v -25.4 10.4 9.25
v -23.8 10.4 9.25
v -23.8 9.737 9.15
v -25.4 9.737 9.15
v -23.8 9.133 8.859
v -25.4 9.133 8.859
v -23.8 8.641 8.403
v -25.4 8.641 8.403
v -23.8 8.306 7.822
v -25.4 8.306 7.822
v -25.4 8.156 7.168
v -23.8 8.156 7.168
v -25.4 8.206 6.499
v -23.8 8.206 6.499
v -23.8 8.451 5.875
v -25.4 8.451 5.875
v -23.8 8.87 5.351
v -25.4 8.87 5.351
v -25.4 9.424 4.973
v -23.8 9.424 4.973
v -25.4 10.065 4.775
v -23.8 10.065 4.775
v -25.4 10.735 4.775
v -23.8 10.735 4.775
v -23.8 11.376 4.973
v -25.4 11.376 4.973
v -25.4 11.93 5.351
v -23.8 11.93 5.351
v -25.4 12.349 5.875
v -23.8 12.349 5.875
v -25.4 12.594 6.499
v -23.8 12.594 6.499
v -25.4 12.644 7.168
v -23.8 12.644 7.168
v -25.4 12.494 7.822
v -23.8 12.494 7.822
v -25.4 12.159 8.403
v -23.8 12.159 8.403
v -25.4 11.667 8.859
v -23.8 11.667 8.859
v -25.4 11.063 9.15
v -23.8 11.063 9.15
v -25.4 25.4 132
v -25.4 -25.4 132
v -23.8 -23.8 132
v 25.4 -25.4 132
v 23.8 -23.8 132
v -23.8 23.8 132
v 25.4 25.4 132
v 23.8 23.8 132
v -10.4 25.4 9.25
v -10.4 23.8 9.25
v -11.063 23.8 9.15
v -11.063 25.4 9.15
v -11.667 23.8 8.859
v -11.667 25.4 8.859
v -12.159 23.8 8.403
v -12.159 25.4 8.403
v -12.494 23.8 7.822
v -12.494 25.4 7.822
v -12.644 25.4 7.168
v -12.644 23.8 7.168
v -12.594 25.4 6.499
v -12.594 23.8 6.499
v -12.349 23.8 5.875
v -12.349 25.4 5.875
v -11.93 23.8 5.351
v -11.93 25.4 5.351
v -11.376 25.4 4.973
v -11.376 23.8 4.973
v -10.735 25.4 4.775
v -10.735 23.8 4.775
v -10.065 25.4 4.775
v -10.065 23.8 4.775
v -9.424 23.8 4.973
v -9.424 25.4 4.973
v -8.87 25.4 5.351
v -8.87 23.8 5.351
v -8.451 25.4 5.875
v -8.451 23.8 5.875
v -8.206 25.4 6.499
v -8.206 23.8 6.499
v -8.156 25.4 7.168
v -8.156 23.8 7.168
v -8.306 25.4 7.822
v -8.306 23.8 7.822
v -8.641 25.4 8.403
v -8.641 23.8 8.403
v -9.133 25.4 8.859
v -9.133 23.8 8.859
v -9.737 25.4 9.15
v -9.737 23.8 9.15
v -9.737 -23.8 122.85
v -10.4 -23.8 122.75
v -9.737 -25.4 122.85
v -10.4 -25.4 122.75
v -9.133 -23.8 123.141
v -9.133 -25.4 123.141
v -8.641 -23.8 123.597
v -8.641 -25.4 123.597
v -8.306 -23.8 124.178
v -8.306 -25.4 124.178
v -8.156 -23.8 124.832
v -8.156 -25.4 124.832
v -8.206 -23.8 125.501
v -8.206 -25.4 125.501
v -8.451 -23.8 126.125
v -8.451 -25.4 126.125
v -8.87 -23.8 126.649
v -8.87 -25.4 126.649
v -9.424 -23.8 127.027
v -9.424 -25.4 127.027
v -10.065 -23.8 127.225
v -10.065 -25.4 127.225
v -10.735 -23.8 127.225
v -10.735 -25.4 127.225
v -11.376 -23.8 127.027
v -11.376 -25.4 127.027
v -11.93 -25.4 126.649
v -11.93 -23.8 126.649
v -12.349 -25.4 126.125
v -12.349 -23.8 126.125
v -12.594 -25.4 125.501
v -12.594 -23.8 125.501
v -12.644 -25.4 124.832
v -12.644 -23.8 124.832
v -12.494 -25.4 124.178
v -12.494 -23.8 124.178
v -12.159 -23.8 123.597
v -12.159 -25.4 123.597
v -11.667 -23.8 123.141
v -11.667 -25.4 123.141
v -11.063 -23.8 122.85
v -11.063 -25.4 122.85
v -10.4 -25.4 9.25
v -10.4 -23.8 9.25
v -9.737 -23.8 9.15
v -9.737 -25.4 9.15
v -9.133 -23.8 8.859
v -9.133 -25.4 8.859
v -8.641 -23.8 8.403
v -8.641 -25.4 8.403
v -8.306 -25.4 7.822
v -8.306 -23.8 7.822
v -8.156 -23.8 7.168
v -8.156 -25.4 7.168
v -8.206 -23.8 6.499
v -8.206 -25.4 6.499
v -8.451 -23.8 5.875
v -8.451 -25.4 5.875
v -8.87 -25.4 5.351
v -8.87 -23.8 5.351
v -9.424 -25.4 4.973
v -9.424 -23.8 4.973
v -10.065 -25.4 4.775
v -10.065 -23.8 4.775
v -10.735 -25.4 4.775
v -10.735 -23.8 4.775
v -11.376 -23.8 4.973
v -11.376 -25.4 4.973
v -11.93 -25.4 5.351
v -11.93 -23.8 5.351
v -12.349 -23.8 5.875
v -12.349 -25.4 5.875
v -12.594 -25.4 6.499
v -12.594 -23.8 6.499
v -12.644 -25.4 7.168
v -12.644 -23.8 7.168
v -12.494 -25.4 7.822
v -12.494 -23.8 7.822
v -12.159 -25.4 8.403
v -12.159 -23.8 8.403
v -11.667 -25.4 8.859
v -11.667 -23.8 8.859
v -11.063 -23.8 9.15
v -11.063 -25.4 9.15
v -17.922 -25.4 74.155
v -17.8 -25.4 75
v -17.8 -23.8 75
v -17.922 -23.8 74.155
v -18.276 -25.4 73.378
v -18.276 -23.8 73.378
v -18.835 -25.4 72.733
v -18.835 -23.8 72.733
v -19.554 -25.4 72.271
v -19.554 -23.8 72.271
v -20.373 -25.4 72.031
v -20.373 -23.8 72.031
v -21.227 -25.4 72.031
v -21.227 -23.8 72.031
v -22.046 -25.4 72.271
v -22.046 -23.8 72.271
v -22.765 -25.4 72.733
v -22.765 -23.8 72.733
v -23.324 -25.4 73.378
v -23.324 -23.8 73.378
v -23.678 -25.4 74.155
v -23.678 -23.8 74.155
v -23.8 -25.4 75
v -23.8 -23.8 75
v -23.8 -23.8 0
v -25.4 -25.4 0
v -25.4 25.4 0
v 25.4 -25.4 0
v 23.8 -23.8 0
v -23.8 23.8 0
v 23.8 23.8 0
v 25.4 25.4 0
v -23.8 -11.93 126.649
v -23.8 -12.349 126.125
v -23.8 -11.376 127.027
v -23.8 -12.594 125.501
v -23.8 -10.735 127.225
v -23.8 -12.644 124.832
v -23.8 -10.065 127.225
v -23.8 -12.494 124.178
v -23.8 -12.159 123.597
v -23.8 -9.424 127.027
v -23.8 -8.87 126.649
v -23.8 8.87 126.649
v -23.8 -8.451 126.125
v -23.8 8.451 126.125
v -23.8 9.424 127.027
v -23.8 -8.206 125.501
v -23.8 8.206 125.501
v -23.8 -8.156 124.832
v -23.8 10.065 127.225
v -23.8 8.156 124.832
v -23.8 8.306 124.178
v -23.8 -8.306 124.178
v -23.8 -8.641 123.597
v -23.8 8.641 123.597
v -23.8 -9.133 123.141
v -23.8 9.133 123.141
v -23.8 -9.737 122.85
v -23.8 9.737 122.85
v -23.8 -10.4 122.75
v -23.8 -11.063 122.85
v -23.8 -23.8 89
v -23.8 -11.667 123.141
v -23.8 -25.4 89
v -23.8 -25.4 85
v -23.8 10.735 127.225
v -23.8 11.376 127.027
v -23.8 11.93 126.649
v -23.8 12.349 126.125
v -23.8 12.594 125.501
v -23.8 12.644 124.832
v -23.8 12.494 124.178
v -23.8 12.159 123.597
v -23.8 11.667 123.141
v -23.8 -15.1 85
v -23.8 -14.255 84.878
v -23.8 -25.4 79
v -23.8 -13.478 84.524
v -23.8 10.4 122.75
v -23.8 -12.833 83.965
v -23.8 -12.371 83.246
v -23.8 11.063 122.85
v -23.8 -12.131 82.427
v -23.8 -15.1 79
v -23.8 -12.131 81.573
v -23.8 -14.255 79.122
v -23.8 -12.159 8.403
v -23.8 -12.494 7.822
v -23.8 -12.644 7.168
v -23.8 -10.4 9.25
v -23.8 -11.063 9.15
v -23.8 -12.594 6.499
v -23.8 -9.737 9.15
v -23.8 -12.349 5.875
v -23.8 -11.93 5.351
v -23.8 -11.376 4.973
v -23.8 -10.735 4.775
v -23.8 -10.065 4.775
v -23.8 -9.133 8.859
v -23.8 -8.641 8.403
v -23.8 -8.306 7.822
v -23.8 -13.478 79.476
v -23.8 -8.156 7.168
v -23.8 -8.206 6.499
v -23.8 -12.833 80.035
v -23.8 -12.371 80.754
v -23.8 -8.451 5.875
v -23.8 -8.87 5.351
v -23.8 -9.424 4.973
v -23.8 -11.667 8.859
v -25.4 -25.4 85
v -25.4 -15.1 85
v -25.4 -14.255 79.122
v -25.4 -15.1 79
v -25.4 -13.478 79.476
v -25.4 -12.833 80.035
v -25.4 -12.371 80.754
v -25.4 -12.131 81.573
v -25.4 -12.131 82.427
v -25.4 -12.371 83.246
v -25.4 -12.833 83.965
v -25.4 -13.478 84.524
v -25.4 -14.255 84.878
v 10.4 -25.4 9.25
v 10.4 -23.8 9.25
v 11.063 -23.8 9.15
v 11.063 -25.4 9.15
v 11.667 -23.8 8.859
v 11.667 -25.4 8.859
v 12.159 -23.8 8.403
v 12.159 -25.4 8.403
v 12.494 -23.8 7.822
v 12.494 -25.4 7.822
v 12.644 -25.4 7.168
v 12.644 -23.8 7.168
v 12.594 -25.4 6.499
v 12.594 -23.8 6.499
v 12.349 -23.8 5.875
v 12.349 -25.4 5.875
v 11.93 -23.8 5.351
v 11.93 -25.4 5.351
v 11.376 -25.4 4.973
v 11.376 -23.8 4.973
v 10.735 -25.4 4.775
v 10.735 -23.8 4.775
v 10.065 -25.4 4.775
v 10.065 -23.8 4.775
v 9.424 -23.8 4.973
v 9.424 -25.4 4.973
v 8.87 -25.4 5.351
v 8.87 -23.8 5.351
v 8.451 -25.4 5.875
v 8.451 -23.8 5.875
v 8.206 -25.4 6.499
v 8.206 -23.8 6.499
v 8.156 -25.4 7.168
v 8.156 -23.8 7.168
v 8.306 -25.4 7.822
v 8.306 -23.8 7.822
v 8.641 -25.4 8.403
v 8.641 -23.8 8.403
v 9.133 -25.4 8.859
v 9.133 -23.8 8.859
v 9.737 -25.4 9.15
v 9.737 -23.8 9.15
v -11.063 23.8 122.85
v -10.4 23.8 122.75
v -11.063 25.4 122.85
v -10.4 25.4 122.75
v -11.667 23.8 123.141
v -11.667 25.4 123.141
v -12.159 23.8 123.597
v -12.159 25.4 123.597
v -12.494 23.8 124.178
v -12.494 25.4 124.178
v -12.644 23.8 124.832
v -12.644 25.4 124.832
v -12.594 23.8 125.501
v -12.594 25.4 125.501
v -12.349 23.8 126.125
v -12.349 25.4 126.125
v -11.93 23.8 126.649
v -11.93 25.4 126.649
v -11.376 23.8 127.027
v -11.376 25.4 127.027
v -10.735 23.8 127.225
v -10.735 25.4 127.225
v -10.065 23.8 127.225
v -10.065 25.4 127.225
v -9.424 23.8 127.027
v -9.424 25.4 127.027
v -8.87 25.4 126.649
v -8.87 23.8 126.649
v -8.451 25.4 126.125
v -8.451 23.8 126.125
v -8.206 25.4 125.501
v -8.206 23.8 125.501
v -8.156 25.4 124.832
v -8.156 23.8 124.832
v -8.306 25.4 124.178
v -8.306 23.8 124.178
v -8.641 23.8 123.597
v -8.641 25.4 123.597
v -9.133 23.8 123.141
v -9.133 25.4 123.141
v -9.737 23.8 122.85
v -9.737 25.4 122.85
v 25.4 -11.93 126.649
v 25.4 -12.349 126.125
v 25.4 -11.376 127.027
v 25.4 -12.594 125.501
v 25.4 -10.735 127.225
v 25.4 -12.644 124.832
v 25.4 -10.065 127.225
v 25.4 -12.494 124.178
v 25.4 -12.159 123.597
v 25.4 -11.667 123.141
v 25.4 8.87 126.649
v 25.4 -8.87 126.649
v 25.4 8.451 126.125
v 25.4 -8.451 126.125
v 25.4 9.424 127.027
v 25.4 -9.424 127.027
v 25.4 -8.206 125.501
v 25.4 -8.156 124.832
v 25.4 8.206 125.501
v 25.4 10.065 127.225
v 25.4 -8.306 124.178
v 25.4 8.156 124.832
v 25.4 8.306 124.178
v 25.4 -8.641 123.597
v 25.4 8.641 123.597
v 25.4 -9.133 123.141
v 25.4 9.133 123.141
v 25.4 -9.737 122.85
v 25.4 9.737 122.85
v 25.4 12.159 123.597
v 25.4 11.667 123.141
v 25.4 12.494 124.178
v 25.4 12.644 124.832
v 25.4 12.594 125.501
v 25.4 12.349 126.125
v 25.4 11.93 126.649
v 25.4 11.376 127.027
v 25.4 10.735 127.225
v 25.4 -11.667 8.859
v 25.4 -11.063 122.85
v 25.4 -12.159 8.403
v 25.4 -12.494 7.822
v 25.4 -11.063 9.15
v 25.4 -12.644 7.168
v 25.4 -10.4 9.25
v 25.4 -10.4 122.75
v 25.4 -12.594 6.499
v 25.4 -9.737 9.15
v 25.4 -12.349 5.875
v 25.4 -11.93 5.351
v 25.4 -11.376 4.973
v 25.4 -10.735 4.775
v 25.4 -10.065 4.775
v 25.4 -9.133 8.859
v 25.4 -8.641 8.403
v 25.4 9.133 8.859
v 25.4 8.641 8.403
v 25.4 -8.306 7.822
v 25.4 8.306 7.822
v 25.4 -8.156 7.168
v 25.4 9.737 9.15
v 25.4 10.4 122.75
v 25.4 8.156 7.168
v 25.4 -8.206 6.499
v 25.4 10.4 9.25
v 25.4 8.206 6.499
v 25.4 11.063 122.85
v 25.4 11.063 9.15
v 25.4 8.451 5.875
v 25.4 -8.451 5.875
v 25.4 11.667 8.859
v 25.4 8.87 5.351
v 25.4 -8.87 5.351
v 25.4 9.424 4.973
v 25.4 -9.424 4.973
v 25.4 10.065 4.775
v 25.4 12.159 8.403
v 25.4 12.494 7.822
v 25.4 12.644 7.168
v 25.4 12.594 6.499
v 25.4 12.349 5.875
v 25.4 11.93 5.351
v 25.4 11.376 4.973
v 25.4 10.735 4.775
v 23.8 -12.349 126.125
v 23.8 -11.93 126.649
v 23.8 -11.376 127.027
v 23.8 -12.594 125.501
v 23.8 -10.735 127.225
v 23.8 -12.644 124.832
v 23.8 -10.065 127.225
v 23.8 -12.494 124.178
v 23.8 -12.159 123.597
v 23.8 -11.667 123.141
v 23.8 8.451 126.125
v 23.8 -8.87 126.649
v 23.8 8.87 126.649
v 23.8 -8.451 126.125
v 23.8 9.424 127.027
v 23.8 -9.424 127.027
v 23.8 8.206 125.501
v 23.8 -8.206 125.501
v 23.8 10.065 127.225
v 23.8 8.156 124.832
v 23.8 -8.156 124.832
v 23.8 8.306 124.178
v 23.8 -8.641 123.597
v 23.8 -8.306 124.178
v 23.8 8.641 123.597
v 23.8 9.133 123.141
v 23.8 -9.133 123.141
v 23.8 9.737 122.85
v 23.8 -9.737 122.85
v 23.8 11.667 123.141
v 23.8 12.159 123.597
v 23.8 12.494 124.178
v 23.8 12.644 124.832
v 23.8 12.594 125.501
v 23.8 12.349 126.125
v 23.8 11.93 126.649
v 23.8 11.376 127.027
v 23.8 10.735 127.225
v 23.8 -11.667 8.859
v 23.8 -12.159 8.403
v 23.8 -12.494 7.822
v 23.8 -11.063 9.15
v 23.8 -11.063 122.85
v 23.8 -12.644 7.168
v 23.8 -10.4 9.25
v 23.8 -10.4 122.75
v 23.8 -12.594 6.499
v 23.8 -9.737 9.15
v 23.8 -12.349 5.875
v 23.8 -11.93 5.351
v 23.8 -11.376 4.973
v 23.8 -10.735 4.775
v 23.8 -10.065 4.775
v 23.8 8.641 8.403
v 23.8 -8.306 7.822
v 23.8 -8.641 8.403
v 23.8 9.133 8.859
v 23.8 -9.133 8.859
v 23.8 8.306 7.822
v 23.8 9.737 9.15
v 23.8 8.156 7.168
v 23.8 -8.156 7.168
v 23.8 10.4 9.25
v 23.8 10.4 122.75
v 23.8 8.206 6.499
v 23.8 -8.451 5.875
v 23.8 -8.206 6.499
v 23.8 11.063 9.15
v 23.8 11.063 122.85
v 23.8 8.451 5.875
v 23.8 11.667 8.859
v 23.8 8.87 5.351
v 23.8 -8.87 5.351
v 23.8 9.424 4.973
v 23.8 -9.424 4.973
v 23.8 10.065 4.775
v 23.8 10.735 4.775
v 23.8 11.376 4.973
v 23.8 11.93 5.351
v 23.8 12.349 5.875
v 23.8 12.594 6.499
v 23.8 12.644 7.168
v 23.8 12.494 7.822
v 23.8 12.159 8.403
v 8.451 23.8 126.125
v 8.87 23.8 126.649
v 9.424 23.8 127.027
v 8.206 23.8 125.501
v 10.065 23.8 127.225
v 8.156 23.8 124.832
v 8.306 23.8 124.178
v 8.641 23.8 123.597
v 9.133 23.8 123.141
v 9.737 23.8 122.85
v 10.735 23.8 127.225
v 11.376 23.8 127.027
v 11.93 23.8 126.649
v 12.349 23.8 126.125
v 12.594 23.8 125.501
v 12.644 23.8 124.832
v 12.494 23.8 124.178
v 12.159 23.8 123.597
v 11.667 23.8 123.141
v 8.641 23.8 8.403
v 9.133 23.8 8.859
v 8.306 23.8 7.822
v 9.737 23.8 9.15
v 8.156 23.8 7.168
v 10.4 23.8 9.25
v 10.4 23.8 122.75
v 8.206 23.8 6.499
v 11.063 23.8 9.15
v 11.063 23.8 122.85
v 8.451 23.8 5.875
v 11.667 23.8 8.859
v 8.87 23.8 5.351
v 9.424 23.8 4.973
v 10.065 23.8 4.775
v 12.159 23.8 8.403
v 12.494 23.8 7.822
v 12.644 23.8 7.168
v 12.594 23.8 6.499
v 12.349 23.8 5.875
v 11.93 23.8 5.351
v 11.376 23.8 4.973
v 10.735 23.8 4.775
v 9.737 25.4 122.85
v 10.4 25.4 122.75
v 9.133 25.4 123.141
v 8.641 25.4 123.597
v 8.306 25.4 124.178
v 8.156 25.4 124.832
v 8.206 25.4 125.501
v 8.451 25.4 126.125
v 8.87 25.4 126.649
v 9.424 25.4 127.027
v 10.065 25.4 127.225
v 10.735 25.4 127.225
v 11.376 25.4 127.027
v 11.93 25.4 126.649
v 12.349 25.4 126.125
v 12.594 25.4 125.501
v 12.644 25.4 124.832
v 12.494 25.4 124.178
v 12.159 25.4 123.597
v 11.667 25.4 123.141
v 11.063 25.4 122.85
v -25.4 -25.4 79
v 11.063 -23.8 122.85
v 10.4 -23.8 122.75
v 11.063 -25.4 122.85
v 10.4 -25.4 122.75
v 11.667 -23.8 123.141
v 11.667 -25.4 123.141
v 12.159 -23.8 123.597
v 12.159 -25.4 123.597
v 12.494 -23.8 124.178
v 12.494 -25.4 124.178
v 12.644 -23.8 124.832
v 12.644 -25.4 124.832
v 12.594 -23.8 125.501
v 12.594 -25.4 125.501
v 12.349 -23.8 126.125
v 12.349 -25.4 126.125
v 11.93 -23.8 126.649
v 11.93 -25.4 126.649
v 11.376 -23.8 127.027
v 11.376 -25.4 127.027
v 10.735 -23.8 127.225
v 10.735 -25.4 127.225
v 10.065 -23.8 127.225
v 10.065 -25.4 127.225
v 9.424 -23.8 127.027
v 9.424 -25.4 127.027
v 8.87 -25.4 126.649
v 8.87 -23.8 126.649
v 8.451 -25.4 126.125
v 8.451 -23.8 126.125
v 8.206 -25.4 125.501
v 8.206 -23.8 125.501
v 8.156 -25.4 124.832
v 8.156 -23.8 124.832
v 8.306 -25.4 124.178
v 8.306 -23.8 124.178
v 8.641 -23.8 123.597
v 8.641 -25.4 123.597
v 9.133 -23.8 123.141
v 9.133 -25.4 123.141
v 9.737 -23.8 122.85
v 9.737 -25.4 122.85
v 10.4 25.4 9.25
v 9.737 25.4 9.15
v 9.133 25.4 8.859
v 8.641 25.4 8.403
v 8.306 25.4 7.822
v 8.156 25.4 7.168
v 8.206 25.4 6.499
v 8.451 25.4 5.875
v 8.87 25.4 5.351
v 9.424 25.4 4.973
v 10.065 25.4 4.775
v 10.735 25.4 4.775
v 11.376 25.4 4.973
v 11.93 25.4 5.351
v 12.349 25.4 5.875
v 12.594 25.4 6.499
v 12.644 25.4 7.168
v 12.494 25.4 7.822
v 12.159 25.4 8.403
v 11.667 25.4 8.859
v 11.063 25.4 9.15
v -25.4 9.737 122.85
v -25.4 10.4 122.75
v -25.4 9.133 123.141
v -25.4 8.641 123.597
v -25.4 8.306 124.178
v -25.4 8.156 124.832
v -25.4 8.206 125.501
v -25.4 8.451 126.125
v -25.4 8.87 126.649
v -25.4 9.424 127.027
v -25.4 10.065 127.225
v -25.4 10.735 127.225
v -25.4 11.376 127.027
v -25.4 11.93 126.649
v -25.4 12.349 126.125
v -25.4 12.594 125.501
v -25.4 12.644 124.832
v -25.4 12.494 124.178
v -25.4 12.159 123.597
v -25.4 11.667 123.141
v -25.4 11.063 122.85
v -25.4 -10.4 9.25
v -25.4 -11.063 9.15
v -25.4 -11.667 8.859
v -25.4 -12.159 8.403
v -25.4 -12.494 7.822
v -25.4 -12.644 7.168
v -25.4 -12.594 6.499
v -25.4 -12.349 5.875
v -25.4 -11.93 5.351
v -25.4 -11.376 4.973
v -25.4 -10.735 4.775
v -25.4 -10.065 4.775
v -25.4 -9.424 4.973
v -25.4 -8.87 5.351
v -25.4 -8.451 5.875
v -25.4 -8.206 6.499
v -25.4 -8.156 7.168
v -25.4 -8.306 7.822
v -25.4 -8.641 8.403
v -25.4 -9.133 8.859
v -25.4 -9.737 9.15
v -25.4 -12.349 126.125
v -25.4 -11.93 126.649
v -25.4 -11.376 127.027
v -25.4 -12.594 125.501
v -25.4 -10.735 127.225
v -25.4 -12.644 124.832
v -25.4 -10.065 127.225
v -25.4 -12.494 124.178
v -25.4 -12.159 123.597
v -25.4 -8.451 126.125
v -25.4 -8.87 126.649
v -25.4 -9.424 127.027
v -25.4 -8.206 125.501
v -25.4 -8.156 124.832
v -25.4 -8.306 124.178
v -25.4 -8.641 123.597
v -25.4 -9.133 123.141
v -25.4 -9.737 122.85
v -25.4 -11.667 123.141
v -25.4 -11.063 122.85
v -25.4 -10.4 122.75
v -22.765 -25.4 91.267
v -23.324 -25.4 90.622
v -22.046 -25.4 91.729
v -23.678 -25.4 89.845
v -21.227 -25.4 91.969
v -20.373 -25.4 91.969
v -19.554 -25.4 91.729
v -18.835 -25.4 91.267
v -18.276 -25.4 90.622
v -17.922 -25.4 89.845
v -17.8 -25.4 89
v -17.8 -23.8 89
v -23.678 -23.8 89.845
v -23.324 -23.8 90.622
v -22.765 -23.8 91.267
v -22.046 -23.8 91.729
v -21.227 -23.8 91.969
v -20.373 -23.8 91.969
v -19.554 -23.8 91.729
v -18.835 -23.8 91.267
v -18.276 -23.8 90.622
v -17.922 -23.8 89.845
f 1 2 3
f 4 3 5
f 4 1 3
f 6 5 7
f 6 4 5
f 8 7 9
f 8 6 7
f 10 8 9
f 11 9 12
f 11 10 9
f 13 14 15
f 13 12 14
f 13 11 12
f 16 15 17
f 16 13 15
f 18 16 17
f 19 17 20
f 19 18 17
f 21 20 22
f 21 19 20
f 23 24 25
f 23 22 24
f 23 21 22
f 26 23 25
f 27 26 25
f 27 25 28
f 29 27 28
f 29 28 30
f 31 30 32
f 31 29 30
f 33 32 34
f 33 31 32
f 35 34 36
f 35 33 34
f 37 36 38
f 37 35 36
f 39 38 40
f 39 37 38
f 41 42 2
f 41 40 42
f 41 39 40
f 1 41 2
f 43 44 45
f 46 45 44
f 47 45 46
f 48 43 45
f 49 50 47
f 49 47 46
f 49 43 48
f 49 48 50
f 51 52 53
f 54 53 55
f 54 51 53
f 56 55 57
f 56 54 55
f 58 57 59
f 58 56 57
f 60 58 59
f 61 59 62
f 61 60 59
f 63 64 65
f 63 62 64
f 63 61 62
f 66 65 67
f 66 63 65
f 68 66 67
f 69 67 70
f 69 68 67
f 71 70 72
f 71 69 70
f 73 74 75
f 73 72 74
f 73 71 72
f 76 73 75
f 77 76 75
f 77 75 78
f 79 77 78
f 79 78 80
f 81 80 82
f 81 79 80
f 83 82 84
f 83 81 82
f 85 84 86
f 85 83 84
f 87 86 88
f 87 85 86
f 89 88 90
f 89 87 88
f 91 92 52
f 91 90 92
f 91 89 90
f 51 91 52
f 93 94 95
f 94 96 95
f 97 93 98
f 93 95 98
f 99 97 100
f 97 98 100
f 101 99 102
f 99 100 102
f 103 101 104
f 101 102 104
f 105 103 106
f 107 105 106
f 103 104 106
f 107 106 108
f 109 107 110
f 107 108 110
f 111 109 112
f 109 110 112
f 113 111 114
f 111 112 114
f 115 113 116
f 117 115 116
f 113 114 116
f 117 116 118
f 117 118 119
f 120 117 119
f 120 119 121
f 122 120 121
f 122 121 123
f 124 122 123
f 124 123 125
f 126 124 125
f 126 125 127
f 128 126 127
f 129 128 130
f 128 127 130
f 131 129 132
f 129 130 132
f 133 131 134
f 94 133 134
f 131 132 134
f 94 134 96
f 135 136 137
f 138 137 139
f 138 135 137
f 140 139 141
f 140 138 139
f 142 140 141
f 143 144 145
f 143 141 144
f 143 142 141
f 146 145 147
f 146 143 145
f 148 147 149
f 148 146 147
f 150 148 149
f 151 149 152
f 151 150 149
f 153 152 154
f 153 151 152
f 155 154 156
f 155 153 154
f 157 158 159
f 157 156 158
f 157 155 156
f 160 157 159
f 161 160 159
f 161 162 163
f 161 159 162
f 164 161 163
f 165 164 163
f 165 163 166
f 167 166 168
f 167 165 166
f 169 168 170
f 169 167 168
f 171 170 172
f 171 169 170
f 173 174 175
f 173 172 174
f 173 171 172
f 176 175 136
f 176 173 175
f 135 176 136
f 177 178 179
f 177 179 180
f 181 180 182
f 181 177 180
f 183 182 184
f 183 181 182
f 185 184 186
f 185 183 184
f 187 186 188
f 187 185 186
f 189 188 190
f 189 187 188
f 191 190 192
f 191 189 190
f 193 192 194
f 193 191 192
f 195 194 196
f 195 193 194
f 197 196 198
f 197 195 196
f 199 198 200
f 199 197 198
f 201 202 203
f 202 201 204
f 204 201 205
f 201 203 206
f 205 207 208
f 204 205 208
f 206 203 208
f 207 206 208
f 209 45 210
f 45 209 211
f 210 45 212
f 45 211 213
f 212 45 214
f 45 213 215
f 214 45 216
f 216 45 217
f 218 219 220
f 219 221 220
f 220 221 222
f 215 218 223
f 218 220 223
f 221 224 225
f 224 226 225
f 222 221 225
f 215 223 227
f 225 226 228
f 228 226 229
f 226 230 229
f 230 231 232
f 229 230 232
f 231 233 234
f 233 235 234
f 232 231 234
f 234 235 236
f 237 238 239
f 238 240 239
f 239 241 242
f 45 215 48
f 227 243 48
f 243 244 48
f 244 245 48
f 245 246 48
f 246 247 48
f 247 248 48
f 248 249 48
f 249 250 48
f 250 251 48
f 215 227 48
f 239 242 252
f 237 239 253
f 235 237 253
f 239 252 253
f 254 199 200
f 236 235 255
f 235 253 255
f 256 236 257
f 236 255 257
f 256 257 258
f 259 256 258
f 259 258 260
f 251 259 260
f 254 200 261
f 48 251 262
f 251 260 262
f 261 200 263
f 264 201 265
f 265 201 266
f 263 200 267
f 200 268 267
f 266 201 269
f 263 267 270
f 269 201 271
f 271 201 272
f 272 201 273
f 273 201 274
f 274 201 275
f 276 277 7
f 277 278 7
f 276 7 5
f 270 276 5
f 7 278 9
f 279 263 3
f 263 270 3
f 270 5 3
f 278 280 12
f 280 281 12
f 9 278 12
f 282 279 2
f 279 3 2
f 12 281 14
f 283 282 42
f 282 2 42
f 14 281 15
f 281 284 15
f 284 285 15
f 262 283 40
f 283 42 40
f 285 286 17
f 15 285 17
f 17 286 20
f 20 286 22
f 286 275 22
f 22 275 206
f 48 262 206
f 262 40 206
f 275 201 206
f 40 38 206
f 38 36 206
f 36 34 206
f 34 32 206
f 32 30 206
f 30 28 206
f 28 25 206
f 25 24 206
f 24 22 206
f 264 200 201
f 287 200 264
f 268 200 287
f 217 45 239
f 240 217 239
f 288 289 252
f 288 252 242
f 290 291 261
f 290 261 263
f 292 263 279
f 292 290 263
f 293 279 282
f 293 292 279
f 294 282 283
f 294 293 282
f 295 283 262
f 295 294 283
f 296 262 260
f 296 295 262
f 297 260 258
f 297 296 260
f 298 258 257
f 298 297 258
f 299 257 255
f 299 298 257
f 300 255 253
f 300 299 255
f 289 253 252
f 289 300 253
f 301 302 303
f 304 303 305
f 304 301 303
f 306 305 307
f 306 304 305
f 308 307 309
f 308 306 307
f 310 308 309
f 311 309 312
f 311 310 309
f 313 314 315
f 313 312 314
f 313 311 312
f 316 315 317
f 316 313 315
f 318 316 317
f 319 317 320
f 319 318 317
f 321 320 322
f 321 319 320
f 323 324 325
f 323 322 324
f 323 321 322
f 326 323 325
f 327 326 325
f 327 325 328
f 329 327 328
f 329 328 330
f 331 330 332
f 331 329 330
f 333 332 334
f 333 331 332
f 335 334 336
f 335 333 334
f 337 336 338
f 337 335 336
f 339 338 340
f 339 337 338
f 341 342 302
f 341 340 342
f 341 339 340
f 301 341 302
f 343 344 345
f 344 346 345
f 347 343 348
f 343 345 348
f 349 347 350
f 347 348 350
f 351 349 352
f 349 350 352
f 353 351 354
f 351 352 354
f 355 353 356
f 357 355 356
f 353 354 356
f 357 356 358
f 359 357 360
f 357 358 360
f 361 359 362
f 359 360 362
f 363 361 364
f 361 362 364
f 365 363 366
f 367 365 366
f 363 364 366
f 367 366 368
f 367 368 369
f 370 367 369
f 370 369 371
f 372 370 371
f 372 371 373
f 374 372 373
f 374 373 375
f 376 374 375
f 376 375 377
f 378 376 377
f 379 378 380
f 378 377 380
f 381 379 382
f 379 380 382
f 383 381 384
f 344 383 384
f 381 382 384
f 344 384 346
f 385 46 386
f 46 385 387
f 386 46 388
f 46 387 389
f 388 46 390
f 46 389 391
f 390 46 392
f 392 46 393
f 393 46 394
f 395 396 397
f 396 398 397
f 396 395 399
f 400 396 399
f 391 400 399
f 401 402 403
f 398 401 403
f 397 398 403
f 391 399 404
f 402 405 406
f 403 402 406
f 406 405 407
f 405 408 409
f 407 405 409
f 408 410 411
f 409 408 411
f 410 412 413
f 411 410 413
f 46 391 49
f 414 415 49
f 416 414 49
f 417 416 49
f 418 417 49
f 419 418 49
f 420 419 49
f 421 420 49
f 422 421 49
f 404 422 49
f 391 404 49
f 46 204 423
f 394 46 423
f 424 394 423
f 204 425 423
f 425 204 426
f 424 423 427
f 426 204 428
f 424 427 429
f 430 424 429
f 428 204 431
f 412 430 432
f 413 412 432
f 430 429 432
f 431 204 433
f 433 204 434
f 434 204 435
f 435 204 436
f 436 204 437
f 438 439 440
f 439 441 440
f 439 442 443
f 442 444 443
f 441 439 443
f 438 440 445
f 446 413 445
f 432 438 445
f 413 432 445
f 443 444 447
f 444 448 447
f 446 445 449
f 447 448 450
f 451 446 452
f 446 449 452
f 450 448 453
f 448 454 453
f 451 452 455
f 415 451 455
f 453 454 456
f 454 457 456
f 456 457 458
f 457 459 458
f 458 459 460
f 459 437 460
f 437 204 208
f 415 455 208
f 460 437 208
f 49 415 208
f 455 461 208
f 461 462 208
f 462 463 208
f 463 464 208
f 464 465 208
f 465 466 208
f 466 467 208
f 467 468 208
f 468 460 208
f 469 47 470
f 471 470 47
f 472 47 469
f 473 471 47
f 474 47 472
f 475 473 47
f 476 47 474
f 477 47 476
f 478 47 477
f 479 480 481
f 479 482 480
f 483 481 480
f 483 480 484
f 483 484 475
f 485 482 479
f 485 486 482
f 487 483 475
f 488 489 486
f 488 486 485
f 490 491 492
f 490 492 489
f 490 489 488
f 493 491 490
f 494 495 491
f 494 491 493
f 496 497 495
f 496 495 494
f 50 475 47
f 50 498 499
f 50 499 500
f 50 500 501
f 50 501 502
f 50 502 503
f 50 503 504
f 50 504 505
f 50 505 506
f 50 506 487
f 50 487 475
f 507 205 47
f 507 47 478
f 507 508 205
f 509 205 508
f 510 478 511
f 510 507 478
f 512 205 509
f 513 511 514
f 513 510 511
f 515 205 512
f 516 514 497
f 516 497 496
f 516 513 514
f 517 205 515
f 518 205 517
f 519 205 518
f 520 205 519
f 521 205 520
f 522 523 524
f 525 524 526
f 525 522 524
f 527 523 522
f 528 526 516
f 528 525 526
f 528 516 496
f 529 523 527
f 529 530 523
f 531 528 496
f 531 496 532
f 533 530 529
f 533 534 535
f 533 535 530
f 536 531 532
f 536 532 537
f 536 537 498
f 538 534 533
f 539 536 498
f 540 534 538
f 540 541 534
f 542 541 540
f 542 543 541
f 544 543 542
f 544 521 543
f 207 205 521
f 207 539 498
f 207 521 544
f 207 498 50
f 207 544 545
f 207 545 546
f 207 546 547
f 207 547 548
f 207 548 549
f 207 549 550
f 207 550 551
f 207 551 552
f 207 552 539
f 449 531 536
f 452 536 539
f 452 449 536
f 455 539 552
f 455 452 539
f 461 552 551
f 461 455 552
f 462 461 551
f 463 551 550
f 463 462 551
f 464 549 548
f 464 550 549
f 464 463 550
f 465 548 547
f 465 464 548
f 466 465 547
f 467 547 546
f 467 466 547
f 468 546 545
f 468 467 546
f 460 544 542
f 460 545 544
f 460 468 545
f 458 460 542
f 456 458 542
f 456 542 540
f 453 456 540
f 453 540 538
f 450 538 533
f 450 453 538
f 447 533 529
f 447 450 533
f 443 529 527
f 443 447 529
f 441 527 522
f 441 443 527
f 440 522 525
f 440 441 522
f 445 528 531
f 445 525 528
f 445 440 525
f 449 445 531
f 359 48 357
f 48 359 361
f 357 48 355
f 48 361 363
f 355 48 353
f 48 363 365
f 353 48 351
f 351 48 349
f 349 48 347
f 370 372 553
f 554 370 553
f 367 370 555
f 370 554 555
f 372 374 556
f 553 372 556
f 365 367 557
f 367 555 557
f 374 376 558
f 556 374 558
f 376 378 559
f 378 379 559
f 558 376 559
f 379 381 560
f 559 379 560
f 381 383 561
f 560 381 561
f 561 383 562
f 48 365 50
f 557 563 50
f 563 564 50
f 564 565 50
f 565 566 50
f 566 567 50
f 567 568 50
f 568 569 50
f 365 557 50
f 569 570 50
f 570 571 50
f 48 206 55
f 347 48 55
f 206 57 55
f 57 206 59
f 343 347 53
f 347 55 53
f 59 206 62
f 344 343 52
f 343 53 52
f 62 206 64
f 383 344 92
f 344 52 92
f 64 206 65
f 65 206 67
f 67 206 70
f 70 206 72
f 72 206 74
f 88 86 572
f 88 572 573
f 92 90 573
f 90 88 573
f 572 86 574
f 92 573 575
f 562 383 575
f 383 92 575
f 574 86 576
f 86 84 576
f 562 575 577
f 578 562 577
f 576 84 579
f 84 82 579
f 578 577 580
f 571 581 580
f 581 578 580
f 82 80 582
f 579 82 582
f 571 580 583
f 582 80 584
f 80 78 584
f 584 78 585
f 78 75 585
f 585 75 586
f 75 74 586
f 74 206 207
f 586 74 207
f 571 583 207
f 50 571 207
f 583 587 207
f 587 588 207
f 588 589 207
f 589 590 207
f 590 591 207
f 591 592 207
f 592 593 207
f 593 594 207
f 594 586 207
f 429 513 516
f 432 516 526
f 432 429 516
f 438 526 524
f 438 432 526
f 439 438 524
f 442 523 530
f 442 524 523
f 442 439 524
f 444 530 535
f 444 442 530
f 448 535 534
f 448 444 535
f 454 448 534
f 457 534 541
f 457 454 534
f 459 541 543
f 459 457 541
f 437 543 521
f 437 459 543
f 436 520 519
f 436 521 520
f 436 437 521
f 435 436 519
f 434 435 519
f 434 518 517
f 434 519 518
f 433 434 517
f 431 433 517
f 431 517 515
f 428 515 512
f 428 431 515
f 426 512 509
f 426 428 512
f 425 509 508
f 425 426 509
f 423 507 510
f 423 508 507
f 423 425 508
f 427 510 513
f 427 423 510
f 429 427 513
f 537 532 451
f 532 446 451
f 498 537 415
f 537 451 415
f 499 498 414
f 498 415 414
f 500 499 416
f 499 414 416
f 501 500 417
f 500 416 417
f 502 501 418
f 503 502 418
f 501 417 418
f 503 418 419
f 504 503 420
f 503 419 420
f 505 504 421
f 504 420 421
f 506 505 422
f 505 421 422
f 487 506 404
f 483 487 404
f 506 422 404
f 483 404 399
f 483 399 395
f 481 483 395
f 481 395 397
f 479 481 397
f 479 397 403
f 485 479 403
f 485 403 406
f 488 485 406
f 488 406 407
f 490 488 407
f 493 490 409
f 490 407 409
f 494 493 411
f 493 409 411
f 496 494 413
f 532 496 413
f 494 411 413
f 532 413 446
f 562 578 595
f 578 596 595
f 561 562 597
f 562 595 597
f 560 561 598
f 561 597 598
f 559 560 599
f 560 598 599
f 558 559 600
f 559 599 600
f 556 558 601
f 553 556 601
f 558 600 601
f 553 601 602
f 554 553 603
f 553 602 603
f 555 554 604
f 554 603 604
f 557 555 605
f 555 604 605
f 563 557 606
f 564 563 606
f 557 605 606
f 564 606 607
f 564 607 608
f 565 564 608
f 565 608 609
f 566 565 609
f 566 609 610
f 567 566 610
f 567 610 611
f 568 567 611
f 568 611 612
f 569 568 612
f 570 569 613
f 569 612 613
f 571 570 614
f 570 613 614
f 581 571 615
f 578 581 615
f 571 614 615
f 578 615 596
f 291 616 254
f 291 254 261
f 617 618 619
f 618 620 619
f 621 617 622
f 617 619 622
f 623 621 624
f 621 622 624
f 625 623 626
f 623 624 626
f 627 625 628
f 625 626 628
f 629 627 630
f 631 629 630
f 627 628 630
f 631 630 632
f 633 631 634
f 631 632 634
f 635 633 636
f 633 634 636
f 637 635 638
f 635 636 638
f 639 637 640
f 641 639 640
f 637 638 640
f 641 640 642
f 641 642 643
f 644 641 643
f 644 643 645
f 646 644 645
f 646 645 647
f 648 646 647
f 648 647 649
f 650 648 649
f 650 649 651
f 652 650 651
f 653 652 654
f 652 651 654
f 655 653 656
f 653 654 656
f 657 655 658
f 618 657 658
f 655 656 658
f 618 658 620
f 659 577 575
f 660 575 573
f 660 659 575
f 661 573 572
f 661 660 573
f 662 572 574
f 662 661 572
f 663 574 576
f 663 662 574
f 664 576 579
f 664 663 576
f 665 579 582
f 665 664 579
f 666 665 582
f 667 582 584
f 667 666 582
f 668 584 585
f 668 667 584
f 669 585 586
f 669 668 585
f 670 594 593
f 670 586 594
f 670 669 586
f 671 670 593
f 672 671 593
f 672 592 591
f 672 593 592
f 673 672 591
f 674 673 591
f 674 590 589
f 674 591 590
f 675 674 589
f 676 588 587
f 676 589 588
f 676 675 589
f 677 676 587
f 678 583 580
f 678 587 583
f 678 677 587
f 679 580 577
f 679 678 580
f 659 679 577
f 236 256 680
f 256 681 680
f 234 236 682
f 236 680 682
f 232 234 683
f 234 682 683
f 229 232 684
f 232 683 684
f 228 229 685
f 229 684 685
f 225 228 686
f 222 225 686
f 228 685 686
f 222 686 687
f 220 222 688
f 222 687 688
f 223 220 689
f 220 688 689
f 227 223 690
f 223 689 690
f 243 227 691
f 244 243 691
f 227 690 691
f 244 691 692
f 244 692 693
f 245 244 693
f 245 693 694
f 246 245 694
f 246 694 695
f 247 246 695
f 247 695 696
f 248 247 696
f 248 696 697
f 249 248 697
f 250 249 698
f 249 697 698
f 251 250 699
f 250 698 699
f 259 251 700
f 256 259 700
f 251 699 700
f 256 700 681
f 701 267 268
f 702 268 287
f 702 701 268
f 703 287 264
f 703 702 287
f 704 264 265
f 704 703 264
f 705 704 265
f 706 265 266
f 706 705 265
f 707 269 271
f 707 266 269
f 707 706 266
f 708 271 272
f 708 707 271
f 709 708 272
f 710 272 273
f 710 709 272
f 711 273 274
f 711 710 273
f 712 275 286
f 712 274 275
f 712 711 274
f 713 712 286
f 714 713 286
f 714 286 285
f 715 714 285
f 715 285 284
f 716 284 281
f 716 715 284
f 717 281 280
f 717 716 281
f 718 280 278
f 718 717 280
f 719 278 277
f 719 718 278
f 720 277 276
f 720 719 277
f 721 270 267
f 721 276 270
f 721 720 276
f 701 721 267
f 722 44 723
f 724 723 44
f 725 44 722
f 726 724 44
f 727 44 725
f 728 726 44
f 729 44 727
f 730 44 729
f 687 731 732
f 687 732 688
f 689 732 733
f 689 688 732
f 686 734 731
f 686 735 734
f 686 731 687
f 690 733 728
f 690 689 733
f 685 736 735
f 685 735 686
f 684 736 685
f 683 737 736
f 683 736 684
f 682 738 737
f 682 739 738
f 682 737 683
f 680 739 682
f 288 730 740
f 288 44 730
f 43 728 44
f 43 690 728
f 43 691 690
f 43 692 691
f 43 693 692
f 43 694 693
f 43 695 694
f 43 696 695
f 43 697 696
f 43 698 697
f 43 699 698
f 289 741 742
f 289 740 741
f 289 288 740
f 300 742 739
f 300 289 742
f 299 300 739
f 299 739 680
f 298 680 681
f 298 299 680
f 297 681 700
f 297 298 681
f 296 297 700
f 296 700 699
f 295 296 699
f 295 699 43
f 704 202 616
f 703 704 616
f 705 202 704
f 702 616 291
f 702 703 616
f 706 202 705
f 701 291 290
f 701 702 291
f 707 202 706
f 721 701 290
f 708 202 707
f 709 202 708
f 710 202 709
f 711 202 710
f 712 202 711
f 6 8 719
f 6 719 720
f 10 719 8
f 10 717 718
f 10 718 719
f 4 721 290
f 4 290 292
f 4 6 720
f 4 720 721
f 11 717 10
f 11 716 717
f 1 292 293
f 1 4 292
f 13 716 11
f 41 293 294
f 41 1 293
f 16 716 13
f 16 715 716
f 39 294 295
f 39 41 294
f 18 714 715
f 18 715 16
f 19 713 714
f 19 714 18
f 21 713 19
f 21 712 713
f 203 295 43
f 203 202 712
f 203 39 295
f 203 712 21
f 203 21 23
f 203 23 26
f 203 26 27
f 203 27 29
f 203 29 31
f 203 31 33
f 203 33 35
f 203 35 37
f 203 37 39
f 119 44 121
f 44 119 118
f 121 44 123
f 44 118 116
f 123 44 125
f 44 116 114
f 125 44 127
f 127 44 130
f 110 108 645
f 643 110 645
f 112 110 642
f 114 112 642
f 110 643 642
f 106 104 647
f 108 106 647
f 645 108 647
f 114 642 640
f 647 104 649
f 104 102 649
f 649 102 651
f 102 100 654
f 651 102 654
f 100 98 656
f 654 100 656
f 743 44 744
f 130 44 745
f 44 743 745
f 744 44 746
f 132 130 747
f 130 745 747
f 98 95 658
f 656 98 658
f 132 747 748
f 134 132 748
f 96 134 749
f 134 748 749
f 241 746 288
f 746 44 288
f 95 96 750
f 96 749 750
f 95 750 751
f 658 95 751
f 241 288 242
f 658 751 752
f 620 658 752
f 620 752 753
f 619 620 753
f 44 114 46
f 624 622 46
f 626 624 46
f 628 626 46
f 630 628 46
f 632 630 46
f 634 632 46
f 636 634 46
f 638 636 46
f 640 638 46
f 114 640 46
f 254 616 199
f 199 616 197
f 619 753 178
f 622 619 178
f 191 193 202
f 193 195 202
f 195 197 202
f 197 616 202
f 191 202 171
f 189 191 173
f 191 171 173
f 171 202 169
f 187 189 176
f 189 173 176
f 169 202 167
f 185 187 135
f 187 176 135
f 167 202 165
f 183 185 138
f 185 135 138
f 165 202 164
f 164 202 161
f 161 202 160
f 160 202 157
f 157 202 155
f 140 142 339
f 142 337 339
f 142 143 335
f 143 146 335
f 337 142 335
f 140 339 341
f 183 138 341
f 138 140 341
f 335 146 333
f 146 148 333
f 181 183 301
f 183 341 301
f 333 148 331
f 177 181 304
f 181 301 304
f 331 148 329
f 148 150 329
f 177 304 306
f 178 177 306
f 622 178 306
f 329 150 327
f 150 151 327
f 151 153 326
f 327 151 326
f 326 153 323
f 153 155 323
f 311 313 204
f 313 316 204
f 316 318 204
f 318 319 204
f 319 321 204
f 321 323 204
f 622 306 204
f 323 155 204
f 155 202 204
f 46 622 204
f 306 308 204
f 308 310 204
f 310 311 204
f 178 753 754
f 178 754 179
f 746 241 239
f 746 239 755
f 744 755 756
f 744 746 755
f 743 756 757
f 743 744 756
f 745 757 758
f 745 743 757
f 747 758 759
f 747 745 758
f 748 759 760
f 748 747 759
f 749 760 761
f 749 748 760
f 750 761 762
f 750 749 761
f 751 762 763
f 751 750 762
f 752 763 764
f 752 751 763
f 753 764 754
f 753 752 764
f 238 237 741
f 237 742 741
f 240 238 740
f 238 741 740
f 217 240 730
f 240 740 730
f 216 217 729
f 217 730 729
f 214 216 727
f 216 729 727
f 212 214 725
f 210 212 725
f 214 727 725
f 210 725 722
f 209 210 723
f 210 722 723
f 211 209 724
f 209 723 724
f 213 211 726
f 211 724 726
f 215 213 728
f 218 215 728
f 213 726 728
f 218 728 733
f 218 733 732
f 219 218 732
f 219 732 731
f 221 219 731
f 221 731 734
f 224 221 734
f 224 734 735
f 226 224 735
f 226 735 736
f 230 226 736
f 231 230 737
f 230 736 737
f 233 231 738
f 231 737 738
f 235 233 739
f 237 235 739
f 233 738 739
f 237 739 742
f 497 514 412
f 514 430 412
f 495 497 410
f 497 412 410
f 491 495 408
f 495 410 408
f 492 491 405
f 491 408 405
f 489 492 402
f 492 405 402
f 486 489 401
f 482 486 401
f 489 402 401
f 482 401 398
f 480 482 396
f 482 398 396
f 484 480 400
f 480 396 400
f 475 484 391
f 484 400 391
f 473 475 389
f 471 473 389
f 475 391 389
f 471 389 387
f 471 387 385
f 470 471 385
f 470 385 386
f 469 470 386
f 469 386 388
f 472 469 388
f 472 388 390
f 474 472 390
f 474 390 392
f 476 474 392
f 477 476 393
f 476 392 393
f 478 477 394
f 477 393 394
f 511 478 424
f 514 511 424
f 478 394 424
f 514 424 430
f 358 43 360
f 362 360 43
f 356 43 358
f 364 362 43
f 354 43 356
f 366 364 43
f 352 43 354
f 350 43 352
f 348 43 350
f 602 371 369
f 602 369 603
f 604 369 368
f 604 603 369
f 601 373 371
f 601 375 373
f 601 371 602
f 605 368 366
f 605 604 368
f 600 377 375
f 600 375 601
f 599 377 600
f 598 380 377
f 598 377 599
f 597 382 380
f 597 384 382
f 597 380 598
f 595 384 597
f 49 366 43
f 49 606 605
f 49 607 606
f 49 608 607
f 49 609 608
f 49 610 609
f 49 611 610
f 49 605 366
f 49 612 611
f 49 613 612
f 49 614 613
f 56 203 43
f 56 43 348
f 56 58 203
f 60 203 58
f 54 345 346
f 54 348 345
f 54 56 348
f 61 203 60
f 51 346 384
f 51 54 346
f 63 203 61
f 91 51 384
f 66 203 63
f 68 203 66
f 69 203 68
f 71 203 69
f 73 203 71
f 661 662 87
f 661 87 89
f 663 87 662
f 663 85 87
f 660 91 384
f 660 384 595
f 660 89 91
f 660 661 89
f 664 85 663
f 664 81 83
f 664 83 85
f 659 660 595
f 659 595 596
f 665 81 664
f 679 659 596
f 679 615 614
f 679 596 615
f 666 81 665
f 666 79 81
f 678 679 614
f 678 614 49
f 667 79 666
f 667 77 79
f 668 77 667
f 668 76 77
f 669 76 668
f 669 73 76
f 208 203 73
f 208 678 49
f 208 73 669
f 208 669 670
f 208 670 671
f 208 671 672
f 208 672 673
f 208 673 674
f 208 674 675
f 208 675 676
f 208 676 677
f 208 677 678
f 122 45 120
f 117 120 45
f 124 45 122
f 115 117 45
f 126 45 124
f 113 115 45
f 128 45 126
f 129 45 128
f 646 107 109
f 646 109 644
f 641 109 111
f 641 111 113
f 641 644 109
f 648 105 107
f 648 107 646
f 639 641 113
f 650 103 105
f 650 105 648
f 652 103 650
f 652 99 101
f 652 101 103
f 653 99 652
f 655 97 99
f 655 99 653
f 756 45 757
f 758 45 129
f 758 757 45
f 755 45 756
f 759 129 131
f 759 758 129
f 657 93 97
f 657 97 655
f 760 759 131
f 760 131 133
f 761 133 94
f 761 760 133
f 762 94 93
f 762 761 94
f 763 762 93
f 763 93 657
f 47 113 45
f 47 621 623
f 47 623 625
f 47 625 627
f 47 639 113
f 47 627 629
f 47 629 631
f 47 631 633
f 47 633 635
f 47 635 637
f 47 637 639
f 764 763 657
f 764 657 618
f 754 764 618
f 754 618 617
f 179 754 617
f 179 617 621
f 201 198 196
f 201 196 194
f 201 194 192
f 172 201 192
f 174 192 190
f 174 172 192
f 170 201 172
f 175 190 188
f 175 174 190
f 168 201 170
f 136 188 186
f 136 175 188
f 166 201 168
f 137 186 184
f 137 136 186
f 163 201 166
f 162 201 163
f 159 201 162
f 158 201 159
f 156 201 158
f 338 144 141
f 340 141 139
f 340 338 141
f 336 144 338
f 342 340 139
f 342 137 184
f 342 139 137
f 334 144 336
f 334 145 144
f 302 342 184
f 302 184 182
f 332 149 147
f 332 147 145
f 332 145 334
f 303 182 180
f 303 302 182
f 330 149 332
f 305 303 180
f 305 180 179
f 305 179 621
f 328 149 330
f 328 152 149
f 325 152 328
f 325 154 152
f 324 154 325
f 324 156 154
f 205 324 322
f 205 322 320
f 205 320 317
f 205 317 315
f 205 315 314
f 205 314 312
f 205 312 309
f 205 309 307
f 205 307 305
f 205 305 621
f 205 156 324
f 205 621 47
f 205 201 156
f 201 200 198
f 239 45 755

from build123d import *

# Parameters (mm, degrees)
SKETCH1_W                     = 50.8
SKETCH1_H                     = 50.8
SKETCH1_W_2                   = 47.6
SKETCH1_H_2                   = 47.6
BOSS_EXTRUDE1_DEPTH           = 132
M4_CLEARANCE_HOLE1_AT_2_COUNT = 2
M4_CLEARANCE_HOLE1_AT_2_PITCH = 20.8
CIRPATTERN1_COUNT             = 4
CUT_EXTRUDE1_DEPTH            = 5
CUT_EXTRUDE2_DEPTH            = 10


with BuildPart() as part:
    # Sketch1 → Boss-Extrude1 (new body)
    with BuildSketch(Plane.XY):
        Rectangle(SKETCH1_W, SKETCH1_H)
        Rectangle(SKETCH1_W_2, SKETCH1_H_2, mode=Mode.SUBTRACT)
    extrude(amount=BOSS_EXTRUDE1_DEPTH)

    # Sketch5 → M4 Clearance Hole1 (revolve, cut)
    with BuildSketch(Plane(origin=(-25.4, 10.4, 7), x_dir=(0, 0, 1), z_dir=(0, 1, 0))):
        Polygon((0, 0), (0, 12.851936393), (2.25, 11.5), (2.25, 0), align=None)
    m4_clearance_hole1 = revolve(axis=Axis((-31.75, 10.4, 7), (1, 0, 0)), mode=Mode.SUBTRACT)

    # M4 Clearance Hole1 at 2: M4 Clearance Hole1 ×2
    with Locations(*[(0, -i * M4_CLEARANCE_HOLE1_AT_2_PITCH, 0) for i in range(1, M4_CLEARANCE_HOLE1_AT_2_COUNT)]):
        add(m4_clearance_hole1, mode=Mode.SUBTRACT)

    # CirPattern1: M4 Clearance Hole1 ×4 about axis
    cirpattern1_axis = Axis((0, 0, 0), (0, 0, 1))
    for i in range(1, CIRPATTERN1_COUNT):
        add(m4_clearance_hole1.rotate(cirpattern1_axis, i * 360 / CIRPATTERN1_COUNT), mode=Mode.SUBTRACT)

    # CirPattern1 copy 1 sketch → CirPattern1 copy 1 (revolve, cut)
    with BuildSketch(Plane(origin=(10.4, -25.4, 7), x_dir=(0, 0, 1), z_dir=(-1, 0, 0))):
        Polygon((0, 0), (0, 12.851936393), (2.25, 11.5), (2.25, 0), align=None)
    revolve(axis=Axis((10.4, -31.75, 7), (0, 1, 0)), mode=Mode.SUBTRACT)

    # CirPattern1 copy 2 sketch → CirPattern1 copy 2 (revolve, cut)
    with BuildSketch(Plane(origin=(25.4, 10.4, 7), x_dir=(0, 0, 1), z_dir=(0, -1, 0))):
        Polygon((0, 0), (0, 12.851936393), (2.25, 11.5), (2.25, 0), align=None)
    revolve(axis=Axis((31.75, 10.4, 7), (-1, 0, 0)), mode=Mode.SUBTRACT)

    # CirPattern1 copy 3 sketch → CirPattern1 copy 3 (revolve, cut)
    with BuildSketch(Plane(origin=(-10.4, 25.4, 7), x_dir=(0, 0, 1), z_dir=(1, 0, 0))):
        Polygon((0, 0), (0, 12.851936393), (2.25, 11.5), (2.25, 0), align=None)
    revolve(axis=Axis((-10.4, 31.75, 7), (0, -1, 0)), mode=Mode.SUBTRACT)

    # Mirror3: M4 Clearance Hole1 across plane
    add(m4_clearance_hole1.mirror(Plane.XY.offset(66)), mode=Mode.SUBTRACT)

    # Mirror3 copy 1 sketch → Mirror3 copy 1 (revolve, cut)
    with BuildSketch(Plane(origin=(-25.4, -10.4, 125), x_dir=(0, 0, -1), z_dir=(0, 1, 0))):
        Polygon((0, 0), (0, -12.851936393), (2.25, -11.5), (2.25, 0), align=None)
    revolve(axis=Axis((-31.75, -10.4, 125), (-1, 0, 0)), mode=Mode.SUBTRACT)

    # Mirror3 copy 2 sketch → Mirror3 copy 2 (revolve, cut)
    with BuildSketch(Plane(origin=(-10.4, -25.4, 125), x_dir=(0, 0, -1), z_dir=(-1, 0, 0))):
        Polygon((0, 0), (0, -12.851936393), (2.25, -11.5), (2.25, 0), align=None)
    revolve(axis=Axis((-10.4, -31.75, 125), (0, -1, 0)), mode=Mode.SUBTRACT)

    # Mirror3 copy 3 sketch → Mirror3 copy 3 (revolve, cut)
    with BuildSketch(Plane(origin=(25.4, -10.4, 125), x_dir=(0, 0, -1), z_dir=(0, -1, 0))):
        Polygon((0, 0), (0, -12.851936393), (2.25, -11.5), (2.25, 0), align=None)
    revolve(axis=Axis((31.75, -10.4, 125), (1, 0, 0)), mode=Mode.SUBTRACT)

    # Mirror3 copy 4 sketch → Mirror3 copy 4 (revolve, cut)
    with BuildSketch(Plane(origin=(10.4, 25.4, 125), x_dir=(0, 0, -1), z_dir=(1, 0, 0))):
        Polygon((0, 0), (0, -12.851936393), (2.25, -11.5), (2.25, 0), align=None)
    revolve(axis=Axis((10.4, 31.75, 125), (0, 1, 0)), mode=Mode.SUBTRACT)

    # Mirror3 copy 5 sketch → Mirror3 copy 5 (revolve, cut)
    with BuildSketch(Plane(origin=(10.4, -25.4, 125), x_dir=(0, 0, -1), z_dir=(-1, 0, 0))):
        Polygon((0, 0), (0, -12.851936393), (2.25, -11.5), (2.25, 0), align=None)
    revolve(axis=Axis((10.4, -31.75, 125), (0, -1, 0)), mode=Mode.SUBTRACT)

    # Mirror3 copy 6 sketch → Mirror3 copy 6 (revolve, cut)
    with BuildSketch(Plane(origin=(25.4, 10.4, 125), x_dir=(0, 0, -1), z_dir=(0, -1, 0))):
        Polygon((0, 0), (0, -12.851936393), (2.25, -11.5), (2.25, 0), align=None)
    revolve(axis=Axis((31.75, 10.4, 125), (1, 0, 0)), mode=Mode.SUBTRACT)

    # Mirror3 copy 7 sketch → Mirror3 copy 7 (revolve, cut)
    with BuildSketch(Plane(origin=(-10.4, 25.4, 125), x_dir=(0, 0, -1), z_dir=(1, 0, 0))):
        Polygon((0, 0), (0, -12.851936393), (2.25, -11.5), (2.25, 0), align=None)
    revolve(axis=Axis((-10.4, 31.75, 125), (0, 1, 0)), mode=Mode.SUBTRACT)

    # Sketch7 → Cut-Extrude1 (cut)
    with BuildSketch(Plane.ZY.offset(25.4)):
        with BuildLine():
            Line((85, -15.1), (85, -30.1))
            ThreePointArc((85, -30.1), (82, -33.1), (79, -30.1))
            Line((79, -30.1), (79, -15.1))
            ThreePointArc((79, -15.1), (82, -12.1), (85, -15.1))
        make_face()
    extrude(amount=-CUT_EXTRUDE1_DEPTH, mode=Mode.SUBTRACT)

    # Sketch8 → Cut-Extrude2 (cut)
    with BuildSketch(Plane.XZ.offset(25.4)):
        with BuildLine():
            Line((-23.8, 75), (-23.8, 89))
            ThreePointArc((-23.8, 89), (-20.8, 92), (-17.8, 89))
            Line((-17.8, 89), (-17.8, 75))
            ThreePointArc((-17.8, 75), (-20.8, 72), (-23.8, 75))
        make_face()
    extrude(amount=-CUT_EXTRUDE2_DEPTH, mode=Mode.SUBTRACT)


solid = part.part
